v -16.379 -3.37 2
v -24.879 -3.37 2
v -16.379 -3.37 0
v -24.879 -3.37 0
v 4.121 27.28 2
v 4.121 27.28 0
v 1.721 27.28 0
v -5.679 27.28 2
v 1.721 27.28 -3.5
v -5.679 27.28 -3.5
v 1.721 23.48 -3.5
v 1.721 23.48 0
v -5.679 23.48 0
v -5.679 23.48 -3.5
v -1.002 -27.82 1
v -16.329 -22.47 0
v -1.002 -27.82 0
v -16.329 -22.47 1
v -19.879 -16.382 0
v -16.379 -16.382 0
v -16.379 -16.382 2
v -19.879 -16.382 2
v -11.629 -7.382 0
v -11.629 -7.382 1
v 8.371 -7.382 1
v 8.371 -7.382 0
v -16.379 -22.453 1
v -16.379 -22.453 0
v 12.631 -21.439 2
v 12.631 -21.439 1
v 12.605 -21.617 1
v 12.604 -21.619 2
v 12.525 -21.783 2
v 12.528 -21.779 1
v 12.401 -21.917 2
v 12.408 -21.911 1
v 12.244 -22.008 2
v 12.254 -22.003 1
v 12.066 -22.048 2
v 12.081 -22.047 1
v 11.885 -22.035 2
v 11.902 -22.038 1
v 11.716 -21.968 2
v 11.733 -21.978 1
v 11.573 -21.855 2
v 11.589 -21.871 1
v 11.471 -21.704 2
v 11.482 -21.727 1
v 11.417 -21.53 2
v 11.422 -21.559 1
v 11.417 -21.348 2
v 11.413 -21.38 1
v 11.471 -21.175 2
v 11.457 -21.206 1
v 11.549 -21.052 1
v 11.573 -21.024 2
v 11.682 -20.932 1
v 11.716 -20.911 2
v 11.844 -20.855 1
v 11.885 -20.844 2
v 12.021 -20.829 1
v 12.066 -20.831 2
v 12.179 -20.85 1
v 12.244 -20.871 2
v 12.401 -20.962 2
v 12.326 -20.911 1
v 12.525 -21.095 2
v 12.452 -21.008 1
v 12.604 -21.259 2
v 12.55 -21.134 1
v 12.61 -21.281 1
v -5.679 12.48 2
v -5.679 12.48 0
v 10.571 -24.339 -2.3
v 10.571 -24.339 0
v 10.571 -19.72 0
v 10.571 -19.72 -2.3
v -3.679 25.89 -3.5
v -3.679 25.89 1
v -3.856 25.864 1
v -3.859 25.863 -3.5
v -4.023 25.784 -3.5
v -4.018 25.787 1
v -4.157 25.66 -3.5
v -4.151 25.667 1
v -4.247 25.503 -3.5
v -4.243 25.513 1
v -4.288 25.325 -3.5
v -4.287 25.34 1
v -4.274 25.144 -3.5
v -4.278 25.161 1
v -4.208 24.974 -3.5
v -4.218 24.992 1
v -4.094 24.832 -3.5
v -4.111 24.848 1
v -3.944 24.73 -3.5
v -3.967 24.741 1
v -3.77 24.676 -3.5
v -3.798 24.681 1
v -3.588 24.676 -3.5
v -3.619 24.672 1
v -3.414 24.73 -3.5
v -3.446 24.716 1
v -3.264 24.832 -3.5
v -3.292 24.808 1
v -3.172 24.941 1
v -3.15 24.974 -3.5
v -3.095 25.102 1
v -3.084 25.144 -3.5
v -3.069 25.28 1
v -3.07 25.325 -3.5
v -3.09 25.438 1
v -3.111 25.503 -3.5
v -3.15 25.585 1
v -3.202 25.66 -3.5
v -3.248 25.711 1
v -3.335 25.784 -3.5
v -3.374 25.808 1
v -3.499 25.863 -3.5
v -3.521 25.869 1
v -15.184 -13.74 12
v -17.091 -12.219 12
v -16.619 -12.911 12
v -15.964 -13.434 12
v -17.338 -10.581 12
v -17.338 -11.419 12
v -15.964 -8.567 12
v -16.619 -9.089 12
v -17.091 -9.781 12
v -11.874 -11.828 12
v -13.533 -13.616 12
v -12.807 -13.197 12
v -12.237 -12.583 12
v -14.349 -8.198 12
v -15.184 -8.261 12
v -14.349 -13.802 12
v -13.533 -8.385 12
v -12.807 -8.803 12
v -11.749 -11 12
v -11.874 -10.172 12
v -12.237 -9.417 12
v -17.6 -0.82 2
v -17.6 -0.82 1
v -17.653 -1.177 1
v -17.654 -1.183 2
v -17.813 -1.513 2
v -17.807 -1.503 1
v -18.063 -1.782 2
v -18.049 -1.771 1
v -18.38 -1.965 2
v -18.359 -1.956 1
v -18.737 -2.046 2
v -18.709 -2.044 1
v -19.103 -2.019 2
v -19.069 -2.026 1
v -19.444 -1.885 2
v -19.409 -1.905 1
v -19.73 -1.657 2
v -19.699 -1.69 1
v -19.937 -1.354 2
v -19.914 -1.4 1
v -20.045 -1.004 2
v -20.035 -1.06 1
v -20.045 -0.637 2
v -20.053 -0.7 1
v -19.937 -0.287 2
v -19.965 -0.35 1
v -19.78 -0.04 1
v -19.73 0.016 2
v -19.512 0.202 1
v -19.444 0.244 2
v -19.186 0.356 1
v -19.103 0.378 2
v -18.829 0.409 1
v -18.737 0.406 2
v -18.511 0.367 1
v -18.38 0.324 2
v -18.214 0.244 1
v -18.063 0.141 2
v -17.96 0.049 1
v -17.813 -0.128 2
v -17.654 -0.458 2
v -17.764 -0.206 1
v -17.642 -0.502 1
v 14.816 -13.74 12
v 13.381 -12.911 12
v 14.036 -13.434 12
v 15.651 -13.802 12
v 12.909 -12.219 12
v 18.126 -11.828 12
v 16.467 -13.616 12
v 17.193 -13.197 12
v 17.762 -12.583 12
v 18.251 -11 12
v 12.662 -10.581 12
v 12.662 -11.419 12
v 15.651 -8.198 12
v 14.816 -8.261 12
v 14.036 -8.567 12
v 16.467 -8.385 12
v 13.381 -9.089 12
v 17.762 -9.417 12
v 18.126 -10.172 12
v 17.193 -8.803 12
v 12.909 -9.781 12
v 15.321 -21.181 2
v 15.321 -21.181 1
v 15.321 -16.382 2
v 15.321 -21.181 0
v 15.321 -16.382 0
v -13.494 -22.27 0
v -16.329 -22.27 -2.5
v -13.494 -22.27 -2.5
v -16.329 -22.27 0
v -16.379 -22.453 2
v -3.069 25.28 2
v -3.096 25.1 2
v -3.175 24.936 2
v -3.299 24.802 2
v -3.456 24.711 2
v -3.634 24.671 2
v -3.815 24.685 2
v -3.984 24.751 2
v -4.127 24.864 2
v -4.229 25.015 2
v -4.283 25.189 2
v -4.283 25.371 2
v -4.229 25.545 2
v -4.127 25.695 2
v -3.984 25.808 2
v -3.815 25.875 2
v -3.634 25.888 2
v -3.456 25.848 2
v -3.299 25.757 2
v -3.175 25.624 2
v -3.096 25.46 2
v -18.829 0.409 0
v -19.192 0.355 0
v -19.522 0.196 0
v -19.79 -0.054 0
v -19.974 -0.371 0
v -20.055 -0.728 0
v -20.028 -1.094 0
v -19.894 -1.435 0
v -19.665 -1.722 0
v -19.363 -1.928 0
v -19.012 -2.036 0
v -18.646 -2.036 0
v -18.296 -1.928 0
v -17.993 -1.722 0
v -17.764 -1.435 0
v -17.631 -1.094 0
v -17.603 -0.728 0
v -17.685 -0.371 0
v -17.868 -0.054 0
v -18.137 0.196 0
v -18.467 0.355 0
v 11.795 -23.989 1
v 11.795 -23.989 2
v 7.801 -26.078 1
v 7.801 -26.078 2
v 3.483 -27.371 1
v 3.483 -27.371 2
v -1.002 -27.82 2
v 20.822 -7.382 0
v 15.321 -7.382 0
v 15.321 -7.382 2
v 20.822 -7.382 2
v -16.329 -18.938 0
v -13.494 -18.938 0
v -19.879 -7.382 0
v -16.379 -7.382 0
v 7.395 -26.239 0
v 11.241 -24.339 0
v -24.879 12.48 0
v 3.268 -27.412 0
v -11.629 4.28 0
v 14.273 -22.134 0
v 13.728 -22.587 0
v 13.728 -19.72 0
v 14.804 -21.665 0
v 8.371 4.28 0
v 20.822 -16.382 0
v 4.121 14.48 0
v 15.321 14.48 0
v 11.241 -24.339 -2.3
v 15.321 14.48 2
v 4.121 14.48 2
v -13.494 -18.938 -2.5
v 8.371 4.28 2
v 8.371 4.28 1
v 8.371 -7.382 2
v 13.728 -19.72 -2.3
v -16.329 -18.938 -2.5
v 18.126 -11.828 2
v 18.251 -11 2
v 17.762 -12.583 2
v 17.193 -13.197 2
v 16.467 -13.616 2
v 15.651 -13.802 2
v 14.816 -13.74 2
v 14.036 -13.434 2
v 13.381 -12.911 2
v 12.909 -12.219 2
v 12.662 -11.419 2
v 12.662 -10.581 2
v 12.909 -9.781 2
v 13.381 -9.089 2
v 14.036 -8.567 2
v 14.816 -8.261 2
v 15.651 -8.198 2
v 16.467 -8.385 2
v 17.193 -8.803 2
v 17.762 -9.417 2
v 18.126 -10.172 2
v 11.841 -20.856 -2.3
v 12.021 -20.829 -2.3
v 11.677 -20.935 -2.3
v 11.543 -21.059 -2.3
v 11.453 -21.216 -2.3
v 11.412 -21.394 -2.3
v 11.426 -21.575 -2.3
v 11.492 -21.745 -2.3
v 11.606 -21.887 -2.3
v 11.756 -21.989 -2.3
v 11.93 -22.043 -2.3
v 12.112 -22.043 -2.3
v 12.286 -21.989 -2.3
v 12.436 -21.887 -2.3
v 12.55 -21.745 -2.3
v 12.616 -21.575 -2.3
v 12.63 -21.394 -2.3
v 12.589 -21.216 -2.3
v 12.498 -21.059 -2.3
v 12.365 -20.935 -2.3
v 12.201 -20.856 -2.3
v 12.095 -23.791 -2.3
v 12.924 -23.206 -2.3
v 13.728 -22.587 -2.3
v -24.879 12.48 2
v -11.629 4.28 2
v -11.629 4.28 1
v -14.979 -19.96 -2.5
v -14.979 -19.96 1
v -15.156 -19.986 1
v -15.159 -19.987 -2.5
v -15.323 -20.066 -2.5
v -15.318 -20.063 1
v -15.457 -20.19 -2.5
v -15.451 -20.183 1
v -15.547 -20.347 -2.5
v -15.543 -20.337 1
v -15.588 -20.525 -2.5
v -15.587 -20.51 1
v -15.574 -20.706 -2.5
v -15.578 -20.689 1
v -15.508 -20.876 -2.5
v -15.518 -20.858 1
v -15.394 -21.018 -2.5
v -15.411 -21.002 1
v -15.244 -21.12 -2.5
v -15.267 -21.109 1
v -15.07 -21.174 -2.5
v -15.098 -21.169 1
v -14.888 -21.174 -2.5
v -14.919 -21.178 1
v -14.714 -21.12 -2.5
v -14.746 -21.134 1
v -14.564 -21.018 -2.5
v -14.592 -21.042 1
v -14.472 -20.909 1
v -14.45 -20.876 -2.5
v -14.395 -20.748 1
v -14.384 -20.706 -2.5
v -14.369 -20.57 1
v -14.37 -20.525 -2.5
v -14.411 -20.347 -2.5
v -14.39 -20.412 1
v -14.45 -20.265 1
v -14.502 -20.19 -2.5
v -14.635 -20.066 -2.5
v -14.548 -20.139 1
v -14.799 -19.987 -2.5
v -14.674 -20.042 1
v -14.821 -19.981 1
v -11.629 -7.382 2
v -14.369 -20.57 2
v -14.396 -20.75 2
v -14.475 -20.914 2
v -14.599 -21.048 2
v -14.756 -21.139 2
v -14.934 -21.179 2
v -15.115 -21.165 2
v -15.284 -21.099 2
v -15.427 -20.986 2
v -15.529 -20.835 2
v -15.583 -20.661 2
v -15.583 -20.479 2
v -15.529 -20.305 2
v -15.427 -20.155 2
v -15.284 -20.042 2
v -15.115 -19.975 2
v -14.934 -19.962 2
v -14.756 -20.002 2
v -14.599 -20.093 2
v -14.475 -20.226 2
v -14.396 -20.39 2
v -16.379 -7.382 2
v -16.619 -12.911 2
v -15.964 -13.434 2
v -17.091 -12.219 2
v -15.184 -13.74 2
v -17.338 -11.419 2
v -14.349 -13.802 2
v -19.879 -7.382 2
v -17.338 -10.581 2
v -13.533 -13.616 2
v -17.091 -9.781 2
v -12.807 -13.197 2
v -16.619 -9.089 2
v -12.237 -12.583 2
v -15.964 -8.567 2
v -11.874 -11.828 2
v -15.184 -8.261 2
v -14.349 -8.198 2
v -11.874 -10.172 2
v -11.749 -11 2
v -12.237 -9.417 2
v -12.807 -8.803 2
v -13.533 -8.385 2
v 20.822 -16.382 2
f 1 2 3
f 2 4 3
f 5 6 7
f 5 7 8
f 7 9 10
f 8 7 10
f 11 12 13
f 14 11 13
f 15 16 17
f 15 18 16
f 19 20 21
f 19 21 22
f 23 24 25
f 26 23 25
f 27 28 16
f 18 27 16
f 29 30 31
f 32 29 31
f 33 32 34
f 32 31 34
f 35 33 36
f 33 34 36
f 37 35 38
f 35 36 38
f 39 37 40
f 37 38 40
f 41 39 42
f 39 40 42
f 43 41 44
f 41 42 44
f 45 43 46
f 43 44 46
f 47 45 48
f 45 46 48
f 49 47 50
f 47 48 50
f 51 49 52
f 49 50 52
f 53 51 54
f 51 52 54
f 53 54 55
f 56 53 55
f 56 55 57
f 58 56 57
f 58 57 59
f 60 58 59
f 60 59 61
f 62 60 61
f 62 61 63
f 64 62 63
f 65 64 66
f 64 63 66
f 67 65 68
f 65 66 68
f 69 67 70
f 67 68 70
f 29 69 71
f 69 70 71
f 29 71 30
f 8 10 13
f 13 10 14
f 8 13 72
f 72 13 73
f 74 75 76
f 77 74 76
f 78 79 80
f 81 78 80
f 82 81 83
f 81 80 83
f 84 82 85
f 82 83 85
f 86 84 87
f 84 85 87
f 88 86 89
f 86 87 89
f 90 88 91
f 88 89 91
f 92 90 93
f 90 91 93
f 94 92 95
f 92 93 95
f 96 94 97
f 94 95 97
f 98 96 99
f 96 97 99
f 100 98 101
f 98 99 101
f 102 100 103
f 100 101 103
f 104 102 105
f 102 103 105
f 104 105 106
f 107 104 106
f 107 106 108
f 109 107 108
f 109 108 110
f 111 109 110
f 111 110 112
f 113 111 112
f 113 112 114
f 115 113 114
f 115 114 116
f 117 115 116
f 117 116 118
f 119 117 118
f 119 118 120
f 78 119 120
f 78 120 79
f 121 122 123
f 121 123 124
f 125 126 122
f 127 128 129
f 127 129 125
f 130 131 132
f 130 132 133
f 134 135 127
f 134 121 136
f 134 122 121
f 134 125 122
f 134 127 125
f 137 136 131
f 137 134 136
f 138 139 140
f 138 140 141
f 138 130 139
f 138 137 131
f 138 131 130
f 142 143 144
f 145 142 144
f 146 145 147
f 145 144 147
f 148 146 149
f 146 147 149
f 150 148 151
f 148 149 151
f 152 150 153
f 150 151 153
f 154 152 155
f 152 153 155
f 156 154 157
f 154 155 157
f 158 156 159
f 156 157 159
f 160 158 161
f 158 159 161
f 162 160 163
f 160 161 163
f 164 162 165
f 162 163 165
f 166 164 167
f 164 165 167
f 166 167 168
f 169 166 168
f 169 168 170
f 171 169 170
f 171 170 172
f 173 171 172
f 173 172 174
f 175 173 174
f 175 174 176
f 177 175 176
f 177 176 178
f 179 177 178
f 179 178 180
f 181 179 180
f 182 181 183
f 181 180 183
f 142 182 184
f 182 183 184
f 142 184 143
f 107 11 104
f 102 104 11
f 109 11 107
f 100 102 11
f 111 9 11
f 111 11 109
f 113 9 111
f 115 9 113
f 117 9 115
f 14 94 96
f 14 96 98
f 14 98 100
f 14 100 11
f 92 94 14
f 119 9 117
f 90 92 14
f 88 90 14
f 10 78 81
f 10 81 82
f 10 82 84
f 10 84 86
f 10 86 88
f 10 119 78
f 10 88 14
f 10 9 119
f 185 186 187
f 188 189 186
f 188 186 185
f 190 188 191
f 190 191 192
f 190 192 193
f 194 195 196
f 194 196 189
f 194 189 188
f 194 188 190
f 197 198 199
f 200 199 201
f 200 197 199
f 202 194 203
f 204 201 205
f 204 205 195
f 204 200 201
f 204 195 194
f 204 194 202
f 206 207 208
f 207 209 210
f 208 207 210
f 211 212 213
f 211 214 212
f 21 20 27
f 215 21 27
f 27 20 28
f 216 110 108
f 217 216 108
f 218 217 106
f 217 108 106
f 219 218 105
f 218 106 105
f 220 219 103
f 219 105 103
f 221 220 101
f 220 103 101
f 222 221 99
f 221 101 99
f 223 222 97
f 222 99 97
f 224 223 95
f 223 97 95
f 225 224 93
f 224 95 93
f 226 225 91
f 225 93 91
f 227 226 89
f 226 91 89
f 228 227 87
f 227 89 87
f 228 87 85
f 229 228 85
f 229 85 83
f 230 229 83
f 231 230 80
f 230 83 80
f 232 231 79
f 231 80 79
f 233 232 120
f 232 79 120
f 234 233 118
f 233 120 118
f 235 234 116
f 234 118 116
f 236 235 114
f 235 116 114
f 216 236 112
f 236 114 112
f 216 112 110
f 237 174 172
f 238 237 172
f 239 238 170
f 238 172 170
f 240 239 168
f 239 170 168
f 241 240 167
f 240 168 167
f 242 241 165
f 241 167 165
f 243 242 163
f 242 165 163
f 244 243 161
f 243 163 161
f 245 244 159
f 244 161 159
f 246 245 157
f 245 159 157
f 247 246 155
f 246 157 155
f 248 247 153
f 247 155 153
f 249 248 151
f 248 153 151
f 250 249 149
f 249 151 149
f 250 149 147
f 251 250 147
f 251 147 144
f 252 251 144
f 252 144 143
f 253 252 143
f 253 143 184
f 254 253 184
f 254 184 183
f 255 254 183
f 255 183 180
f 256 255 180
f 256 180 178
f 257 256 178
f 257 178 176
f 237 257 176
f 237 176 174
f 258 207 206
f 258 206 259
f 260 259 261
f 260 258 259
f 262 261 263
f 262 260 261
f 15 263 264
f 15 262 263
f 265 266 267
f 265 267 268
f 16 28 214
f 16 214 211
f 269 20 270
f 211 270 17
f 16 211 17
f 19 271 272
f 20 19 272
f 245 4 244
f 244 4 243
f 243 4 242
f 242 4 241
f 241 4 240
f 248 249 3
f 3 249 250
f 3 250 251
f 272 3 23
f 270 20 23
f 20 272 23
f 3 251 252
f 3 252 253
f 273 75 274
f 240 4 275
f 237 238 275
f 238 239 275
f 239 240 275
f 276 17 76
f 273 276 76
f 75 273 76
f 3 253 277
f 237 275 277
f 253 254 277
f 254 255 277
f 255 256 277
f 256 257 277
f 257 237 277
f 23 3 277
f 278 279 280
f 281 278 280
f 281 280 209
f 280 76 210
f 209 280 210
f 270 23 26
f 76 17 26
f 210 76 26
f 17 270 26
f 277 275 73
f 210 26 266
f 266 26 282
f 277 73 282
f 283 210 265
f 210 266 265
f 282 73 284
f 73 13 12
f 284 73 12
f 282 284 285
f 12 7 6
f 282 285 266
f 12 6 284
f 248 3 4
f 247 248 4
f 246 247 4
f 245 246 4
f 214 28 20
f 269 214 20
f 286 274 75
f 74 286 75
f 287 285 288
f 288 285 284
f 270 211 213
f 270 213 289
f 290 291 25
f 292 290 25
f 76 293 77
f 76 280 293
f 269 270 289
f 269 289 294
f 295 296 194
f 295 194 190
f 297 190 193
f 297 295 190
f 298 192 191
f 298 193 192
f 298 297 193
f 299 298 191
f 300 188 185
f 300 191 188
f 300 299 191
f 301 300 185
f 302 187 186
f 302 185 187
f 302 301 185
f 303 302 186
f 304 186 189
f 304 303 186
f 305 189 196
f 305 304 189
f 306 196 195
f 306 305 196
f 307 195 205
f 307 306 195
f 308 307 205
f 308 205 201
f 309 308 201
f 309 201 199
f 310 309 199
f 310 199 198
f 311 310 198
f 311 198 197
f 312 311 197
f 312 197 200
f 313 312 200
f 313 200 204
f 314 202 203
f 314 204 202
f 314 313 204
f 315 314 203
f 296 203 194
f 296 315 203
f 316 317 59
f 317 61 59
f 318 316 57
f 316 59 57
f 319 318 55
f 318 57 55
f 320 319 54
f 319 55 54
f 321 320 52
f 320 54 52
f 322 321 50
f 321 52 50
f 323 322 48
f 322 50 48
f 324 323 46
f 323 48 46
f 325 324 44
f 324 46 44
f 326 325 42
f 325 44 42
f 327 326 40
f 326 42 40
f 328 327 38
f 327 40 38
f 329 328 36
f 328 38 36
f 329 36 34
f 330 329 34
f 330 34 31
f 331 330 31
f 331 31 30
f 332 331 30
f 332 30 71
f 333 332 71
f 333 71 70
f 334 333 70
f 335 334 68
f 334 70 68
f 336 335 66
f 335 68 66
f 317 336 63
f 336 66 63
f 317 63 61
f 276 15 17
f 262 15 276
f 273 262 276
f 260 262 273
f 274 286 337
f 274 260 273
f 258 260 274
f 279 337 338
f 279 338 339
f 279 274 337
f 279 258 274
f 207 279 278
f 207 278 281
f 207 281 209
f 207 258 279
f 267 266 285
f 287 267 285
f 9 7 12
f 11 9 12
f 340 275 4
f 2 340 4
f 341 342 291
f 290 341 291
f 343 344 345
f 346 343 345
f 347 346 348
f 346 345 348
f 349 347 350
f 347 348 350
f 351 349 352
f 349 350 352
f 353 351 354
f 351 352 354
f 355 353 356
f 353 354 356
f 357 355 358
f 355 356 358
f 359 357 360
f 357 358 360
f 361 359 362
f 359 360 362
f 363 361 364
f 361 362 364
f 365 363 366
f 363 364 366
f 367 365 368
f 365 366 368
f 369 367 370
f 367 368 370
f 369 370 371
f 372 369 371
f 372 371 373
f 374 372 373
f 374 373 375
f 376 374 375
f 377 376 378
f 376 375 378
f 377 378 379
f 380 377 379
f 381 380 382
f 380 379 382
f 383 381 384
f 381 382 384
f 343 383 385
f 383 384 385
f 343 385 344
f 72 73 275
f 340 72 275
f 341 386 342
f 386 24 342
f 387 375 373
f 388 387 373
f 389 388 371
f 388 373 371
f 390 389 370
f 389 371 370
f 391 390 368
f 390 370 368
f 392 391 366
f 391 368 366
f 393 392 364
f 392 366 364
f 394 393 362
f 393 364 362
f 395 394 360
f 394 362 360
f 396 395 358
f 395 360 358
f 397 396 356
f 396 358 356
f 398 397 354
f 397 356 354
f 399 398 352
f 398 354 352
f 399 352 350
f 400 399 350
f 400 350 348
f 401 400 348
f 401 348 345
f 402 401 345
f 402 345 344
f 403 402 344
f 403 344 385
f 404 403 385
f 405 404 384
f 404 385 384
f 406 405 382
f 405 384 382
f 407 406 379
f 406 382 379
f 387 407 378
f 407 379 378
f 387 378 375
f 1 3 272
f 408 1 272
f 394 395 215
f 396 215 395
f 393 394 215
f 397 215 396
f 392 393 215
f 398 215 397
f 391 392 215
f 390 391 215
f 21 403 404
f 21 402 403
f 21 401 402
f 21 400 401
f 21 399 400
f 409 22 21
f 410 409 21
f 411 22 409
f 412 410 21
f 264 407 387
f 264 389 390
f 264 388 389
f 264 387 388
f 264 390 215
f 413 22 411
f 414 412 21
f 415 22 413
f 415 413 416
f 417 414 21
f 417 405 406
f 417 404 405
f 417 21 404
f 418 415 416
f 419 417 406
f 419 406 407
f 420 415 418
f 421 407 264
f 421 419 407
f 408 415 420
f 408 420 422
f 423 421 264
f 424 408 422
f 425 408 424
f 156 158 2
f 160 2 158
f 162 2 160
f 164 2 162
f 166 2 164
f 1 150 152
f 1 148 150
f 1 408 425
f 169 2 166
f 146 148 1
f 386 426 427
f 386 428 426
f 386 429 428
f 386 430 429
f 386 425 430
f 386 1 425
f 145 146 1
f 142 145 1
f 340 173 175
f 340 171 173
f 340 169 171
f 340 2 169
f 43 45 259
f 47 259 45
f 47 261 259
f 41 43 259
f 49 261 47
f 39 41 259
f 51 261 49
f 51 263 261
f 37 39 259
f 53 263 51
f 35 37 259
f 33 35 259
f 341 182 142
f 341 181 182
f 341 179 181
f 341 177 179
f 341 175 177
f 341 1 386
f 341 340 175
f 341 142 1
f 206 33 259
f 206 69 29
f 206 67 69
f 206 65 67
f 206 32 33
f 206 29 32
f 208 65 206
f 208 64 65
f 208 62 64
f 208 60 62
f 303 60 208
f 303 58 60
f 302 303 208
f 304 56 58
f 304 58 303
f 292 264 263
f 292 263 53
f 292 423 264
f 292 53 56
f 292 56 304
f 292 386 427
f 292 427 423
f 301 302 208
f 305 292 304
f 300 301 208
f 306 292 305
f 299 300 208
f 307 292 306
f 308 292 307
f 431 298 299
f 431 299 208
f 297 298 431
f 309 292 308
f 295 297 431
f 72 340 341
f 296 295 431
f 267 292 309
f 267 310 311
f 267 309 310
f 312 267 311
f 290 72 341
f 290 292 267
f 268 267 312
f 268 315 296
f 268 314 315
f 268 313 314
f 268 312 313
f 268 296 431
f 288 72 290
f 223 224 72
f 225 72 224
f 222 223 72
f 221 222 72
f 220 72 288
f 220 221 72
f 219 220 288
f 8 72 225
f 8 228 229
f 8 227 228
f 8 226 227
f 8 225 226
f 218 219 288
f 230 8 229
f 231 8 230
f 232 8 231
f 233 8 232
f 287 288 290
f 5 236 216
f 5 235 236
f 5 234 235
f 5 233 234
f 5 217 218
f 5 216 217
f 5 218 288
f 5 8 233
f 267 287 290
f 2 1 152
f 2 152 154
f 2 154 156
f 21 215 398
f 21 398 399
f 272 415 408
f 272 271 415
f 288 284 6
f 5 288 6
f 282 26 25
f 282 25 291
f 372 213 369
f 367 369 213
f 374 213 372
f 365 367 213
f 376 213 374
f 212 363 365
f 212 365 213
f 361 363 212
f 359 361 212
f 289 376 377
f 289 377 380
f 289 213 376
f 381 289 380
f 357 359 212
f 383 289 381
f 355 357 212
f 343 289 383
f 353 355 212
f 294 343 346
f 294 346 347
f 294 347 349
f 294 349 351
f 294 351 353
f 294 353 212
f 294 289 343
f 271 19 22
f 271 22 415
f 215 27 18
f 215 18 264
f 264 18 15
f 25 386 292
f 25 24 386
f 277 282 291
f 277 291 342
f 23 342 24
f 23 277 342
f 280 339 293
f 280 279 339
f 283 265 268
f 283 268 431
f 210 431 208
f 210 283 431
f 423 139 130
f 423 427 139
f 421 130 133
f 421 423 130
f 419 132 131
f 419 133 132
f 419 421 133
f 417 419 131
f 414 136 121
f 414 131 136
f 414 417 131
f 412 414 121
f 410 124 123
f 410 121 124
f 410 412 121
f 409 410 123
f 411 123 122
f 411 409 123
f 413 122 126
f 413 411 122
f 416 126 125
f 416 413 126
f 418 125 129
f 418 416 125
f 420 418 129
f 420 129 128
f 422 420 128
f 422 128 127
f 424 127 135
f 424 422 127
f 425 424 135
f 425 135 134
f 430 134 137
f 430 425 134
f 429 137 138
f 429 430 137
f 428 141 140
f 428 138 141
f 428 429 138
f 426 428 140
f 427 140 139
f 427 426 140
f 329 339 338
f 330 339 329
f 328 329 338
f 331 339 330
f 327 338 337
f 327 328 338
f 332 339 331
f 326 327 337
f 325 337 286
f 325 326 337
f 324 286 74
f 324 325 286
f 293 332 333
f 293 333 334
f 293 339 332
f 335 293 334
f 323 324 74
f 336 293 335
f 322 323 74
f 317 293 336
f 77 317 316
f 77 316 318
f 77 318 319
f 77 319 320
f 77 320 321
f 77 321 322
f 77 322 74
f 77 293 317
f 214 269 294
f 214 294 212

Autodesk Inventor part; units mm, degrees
ref_plane "YZ Plane" through (0, 0, 0) normal (1, 0, 0) x (0, 1, 0)
ref_plane "XZ Plane" through (0, 0, 0) normal (0, 1, 0) x (-1, 0, 0)
ref_plane "XY Plane" through (0, 0, 0) normal (0, 0, 1) x (1, 0, 0)
sketch "Skizze1" plane through (0, 0, 0) normal (0, 0, 1) x (1, 0, 0)
  circle A0 centre (-18.8292, -0.8203) radius 1.45 construction
  line L0 (-24.8792, -2.7703) -> (-24.8792, 8.6797) construction
  arc A1 (-11.8792, -25.2203) -> (6.3208, -26.6782) centre (-1.0025, -3.77) ccw construction
  circle A2 centre (-14.9792, -20.5703) radius 0.9 construction
  circle A3 centre (12.0208, -21.4394) radius 0.9 construction
  circle A4 centre (-3.6792, 25.2797) radius 0.9 construction
  line L1 (-5.6792, 27.2797) -> (3.4208, 27.2797) construction
  line L2 (25.1208, 7.4797) -> (25.1208, -1.5203) construction
  line L3 (25.1208, -27.8203) -> (-24.8792, -27.8203)
  line L4 (-24.8792, -27.8203) -> (-24.8792, 27.2797)
  line L5 (-24.8792, 27.2797) -> (25.1208, 27.2797)
  line L6 (25.1208, 27.2797) -> (25.1208, -27.8203)
  line L7 (4.6208, 0.2797) -> (4.6208, -6.9703) construction
  line L8 (-4.8792, 0.2797) -> (4.6208, 0.2797) construction
  line L9 (-4.8792, -6.9703) -> (-4.8792, 0.2797) construction
  line L10 (4.6208, -6.9703) -> (-4.8792, -6.9703) construction
  line L11 (-2.2292, 2.2797) -> (1.9708, 2.2797) construction
  line L12 (6.3708, 2.2797) -> (1.9708, 2.2797) construction
  line L13 (6.3708, -8.9703) -> (6.3708, 2.2797) construction
  line L14 (1.9708, -8.9703) -> (6.3708, -8.9703) construction
  line L15 (1.9708, -8.9703) -> (-2.2292, -8.9703) construction
  line L16 (-6.6292, -8.9703) -> (-2.2292, -8.9703) construction
  line L17 (-6.6292, 2.2797) -> (-6.6292, -8.9703) construction
  line L18 (-2.2292, 2.2797) -> (-6.6292, 2.2797) construction
  line L19 (-11.6292, -10.9703) -> (8.3708, -10.9703)
  line L20 (8.3708, -10.9703) -> (8.3708, 4.2797)
  line L21 (8.3708, 4.2797) -> (-11.6292, 4.2797)
  line L22 (-11.6292, 4.2797) -> (-11.6292, -10.9703)
  point P0 (0, 0)
  dimension "d48" = 2
  dimension "d49" = 2
  dimension "d50" = 2
  dimension "d51" = 5
extrude "Extrusion1" add sketch "Skizze1" along normal blind 1
sketch "Skizze2" plane through (0, 0, 0) normal (0, 0, -1) x (-1, 0, 0)
  circle A0 centre (14.9792, -20.5703) radius 0.9 projected
  circle A1 centre (-12.0208, -21.4394) radius 0.9 construction
  circle A2 centre (3.6792, 25.2797) radius 0.9 construction
  circle A3 centre (14.9792, -20.5703) radius 0.9 projected
  circle A4 centre (9.7292, -19.9703) radius 0.75 projected
  line L0 (17.9792, -20.8203) -> (16.3292, -20.8203) construction
  line L1 (7.7292, -22.4703) -> (11.8792, -22.4703) construction
  line L2 (7.7292, -17.4703) -> (7.7292, -22.4703) construction
  line L3 (16.3292, -17.4703) -> (7.7292, -17.4703) construction
  line L4 (16.3292, -20.8203) -> (16.3292, -17.4703) construction
  line L5 (16.3292, -22.2703) -> (7.9292, -22.2703)
  line L6 (7.9292, -22.2703) -> (7.9292, -17.6703)
  line L7 (7.9292, -17.6703) -> (16.3292, -17.6703)
  line L8 (16.3292, -17.6703) -> (16.3292, -22.2703)
  line L9 (11.8792, -22.2703) -> (12.162, -22.2703) construction
  line L10 (16.3292, -17.6703) -> (12.3496, -17.6703)
  line L11 (12.3496, -17.6703) -> (12.3496, -22.2703)
  line L12 (12.3496, -22.2703) -> (16.3292, -22.2703)
  line L13 (16.3292, -22.2703) -> (16.3292, -17.6703)
  line L14 (16.3292, -22.2703) -> (13.494, -22.2703)
  line L15 (13.494, -22.2703) -> (13.494, -18.9379)
  line L16 (13.494, -18.9379) -> (16.3292, -18.9379)
  line L17 (16.3292, -18.9379) -> (16.3292, -22.2703)
  point P0 (0, 0)
  dimension "d3" = 0.2
  dimension "d4" = 0.2
  dimension "d9" = 0.2
extrude "Extrusion2" add sketch "Skizze2" along normal blind 2.5 contours A0 | L5 L15 L16 L8
sketch "Skizze3" plane through (0, 0, -2.5) normal (0, 0, -1) x (-1, 0, 0)
  circle A0 centre (14.9792, -20.5703) radius 0.9 construction
  point P0 (0, 0)
hole "Bohrung1" at (-14.9792, -20.5703, -2.5) direction (0, 0, 1) diameter 1.221 depth 6.1 tip angle 118 thread size "M1.6x0.35" class "6H" standard "ISO Metric profile"
sketch "Skizze4" plane through (0, 0, 0) normal (0, 0, -1) x (-1, 0, 0)
  circle A0 centre (18.8292, -0.8203) radius 1.45 construction
  point P0 (0, 0)
hole "Bohrung2" at (-18.8292, -0.8203, 0) direction (0, 0, 1) diameter 2.459 end through all thread size "M3x0.5" class "6H" standard "ISO Metric profile"
sketch "Skizze5" plane through (0, 0, 0) normal (0, 0, -1) x (-1, 0, 0)
  line L0 (-9.3708, -21.4703) -> (-9.3708, -17.9703) construction
  line L1 (-14.1208, -16.9703) -> (-14.1208, -22.4703) construction
  line L2 (-15.3208, -16.9703) -> (-10.3708, -16.9703) construction
  line L3 (-9.3708, -17.9703) -> (-10.3708, -16.9703) construction
  line L4 (-9.3708, -21.4703) -> (-9.3708, -17.9703) construction
  line L5 (-10.5708, -16.9703) -> (-15.3208, -16.9703)
  line L6 (-15.3208, -16.9703) -> (-15.3208, -24.3394)
  line L7 (-15.3208, -24.3394) -> (-10.5708, -24.3394)
  line L8 (-10.5708, -24.3394) -> (-10.5708, -16.9703)
  line L9 (-15.3208, -16.9703) -> (-15.3208, -1.5203) construction
  circle A0 centre (-12.0208, -21.4394) radius 0.9 construction
  line L10 (-10.5708, -24.3394) -> (-13.7279, -24.3394)
  line L11 (-13.7279, -24.3394) -> (-13.7279, -16.9703)
  line L12 (-13.7279, -16.9703) -> (-10.5708, -16.9703)
  line L13 (-10.5708, -16.9703) -> (-10.5708, -24.3394)
  line L14 (-10.5708, -24.3394) -> (-13.7279, -24.3394)
  line L15 (-13.7279, -24.3394) -> (-13.7279, -19.7203)
  line L16 (-13.7279, -19.7203) -> (-10.5708, -19.7203)
  line L17 (-10.5708, -19.7203) -> (-10.5708, -24.3394)
  point P0 (0, 0)
extrude "Extrusion3" add sketch "Skizze5" along normal blind 2.3 contours L8 L7 L11 L16
sketch "Skizze6" plane through (0, 0, -2.3) normal (0, 0, -1) x (-1, 0, 0)
  circle A0 centre (-12.0208, -21.4394) radius 0.9 construction
  point P0 (0, 0)
hole "Bohrung3" at (12.0208, -21.4394, -2.3) direction (0, 0, 1) diameter 1.221 depth 7.1 tip angle 118 thread size "M1.6x0.35" class "6H" standard "ISO Metric profile"
sketch "Skizze7" plane through (0, 0, 0) normal (0, 0, -1) x (-1, 0, 0)
  circle A0 centre (3.6792, 25.2797) radius 0.9 construction
  line L0 (-3.4208, 24.7797) -> (-3.4208, 27.2797) construction
  line L1 (-1.9208, 24.7797) -> (-3.4208, 24.7797) construction
  line L2 (-1.9208, 23.2797) -> (-1.9208, 24.7797) construction
  line L3 (5.6792, 23.2797) -> (-1.9208, 23.2797) construction
  line L4 (5.6792, 27.2797) -> (5.6792, 23.2797) construction
  line L5 (-3.4208, 27.2797) -> (5.6792, 27.2797) construction
  line L6 (6.6792, 27.2797) -> (-1.7208, 27.2797)
  line L7 (-1.7208, 27.2797) -> (-1.7208, 23.4797)
  line L8 (-1.7208, 23.4797) -> (6.6792, 23.4797)
  line L9 (6.6792, 23.4797) -> (6.6792, 27.2797)
  point P0 (0, 0)
  dimension "d35" = 0.2
  dimension "d36" = 0.2
  dimension "d38" = 3
extrude "Extrusion4" add sketch "Skizze7" along normal blind 3.5
sketch "Skizze8" plane through (0, 0, -3.5) normal (0, 0, -1) x (-1, 0, 0)
  circle A0 centre (3.6792, 25.2797) radius 0.9 construction
  point P0 (0, 0)
hole "Bohrung4" at (-3.6792, 25.2797, -3.5) direction (0, 0, 1) diameter 1.221 depth 7.1 tip angle 118 thread size "M1.6x0.35" class "6H" standard "ISO Metric profile"
sketch "Sketch9" plane through (0, 0, 1) normal (0, 0, 1) x (1, 0, 0)
  circle A0 centre (-18.8292, -0.8203) radius 1.45 construction
  line L0 (-22.6792, 10.4902) -> (-22.6792, -2.5703) construction
  line L1 (-22.6792, -2.5703) -> (-21.2792, -2.5703) construction
  line L2 (-21.2792, -2.5703) -> (-21.2792, 8.1297) construction
  arc A1 (-19.5792, 9.8297) -> (-21.2792, 8.1297) centre (-19.5792, 8.1297) ccw construction
  line L3 (-19.5792, 9.8297) -> (-13.5792, 9.8297) construction
  line L4 (-13.5792, 9.8297) -> (-13.5792, 11.4797) construction
  line L5 (-13.5792, 11.4797) -> (-22.1079, 11.4797) construction
  line L6 (-22.1079, 11.4797) -> (-22.6792, 10.4902) construction
  line L7 (-5.6792, 23.2797) -> (1.9208, 23.2797) construction
  line L8 (1.9208, 23.2797) -> (1.9208, 24.7797) construction
  line L9 (1.9208, 24.7797) -> (4.1208, 24.7797) construction
  line L10 (4.1208, 24.7797) -> (4.1208, 14.4797) construction
  line L11 (4.1208, 14.4797) -> (20.1208, 14.4797) construction
  line L12 (20.1208, 14.4797) -> (20.1208, 12.4797) construction
  line L13 (20.1208, 12.4797) -> (22.2341, 12.4797) construction
  line L14 (22.2341, 12.4797) -> (25.1208, 7.4797) construction
  line L15 (25.1208, 7.4797) -> (25.1208, -1.5203) construction
  line L16 (25.1208, -1.5203) -> (15.8208, -1.5203) construction
  line L17 (15.8208, -1.5203) -> (15.8208, -0.8203) construction
  line L18 (15.8208, -0.8203) -> (11.8208, -0.8203) construction
  line L19 (11.8208, -0.8203) -> (11.8208, -19.3203) construction
  line L20 (11.8208, -19.3203) -> (10.8208, -19.3203) construction
  line L21 (10.8208, -19.3203) -> (10.8208, 0.6797) construction
  line L22 (10.8208, 0.6797) -> (11.8208, 0.6797) construction
  line L23 (11.8208, 0.6797) -> (11.8208, 10.4297) construction
  line L24 (11.8208, 10.4297) -> (5.3208, 10.4297) construction
  line L25 (5.3208, 10.4297) -> (5.3208, 9.1297) construction
  line L26 (5.3208, 9.1297) -> (-19.5792, 9.1297) construction
  arc A2 (-19.5792, 9.1297) -> (-20.5792, 8.1297) centre (-19.5792, 8.1297) ccw construction
  line L27 (-20.5792, 8.1297) -> (-20.5792, 2.1297) construction
  arc A3 (-20.5792, 2.1297) -> (-20.0792, 1.6297) centre (-20.0792, 2.1297) ccw construction
  line L28 (-20.0792, 1.6297) -> (-18.8292, 1.6297) construction
  arc A4 (-16.3792, -0.8203) -> (-18.8292, 1.6297) centre (-18.8292, -0.8203) ccw construction
  line L29 (-16.3792, -0.8203) -> (-16.3792, -1.3703) construction
  arc A5 (-18.3792, -3.3703) -> (-16.3792, -1.3703) centre (-18.3792, -1.3703) ccw construction
  line L30 (-18.3792, -3.3703) -> (-23.4792, -3.3703) construction
  line L31 (-23.4792, -3.3703) -> (-23.4792, 11.1046) construction
  line L32 (-23.4792, 11.1046) -> (-22.6852, 12.4797) construction
  line L33 (-22.6852, 12.4797) -> (-13.6792, 12.4797) construction
  arc A6 (-13.6792, 12.4797) -> (-5.6792, 20.4797) centre (-13.6792, 20.4797) ccw construction
  line L34 (-5.6792, 20.4797) -> (-5.6792, 23.2797) construction
  line L35 (-7.8792, -20.1624) -> (-7.8792, -26.8162) construction
  arc A7 (-9.8792, -26.1222) -> (-7.8792, -26.8162) centre (-1.0025, -3.77) ccw construction
  line L36 (-9.8792, -26.1222) -> (-9.8792, -22.1222) construction
  line L37 (-9.8792, -22.1222) -> (-13.6811, -18.3203) construction
  line L38 (-13.6811, -18.3203) -> (-16.6811, -18.3203) construction
  line L39 (-16.6811, -18.3203) -> (-16.6811, -20.8203) construction
  line L40 (-24.8792, -20.8203) -> (-16.6811, -20.8203) construction
  line L41 (-24.8792, -3.3703) -> (-24.8792, -20.8203) construction
  line L42 (-18.3792, -3.3703) -> (-24.8792, -3.3703) construction
  arc A8 (-18.3792, -3.3703) -> (-16.3792, -1.3703) centre (-18.3792, -1.3703) ccw construction
  line L43 (-16.3792, -15.8703) -> (-16.3792, -1.3703) construction
  line L44 (-12.1713, -15.8703) -> (-16.3792, -15.8703) construction
  line L45 (-12.1713, -15.8703) -> (-7.8792, -20.1624) construction
  line L46 (9.3208, 7.5297) -> (11.8208, 7.5297) construction
  line L47 (11.8208, 0.6797) -> (11.8208, 7.5297) construction
  line L48 (10.8208, 0.6797) -> (11.8208, 0.6797) construction
  line L49 (10.8208, -19.3203) -> (10.8208, 0.6797) construction
  line L50 (11.8208, -19.3203) -> (10.8208, -19.3203) construction
  line L51 (11.8208, -0.8203) -> (11.8208, -19.3203) construction
  line L52 (15.8208, -0.8203) -> (11.8208, -0.8203) construction
  line L53 (15.8208, -1.5203) -> (15.8208, -0.8203) construction
  line L54 (15.3208, -1.5203) -> (15.8208, -1.5203) construction
  line L55 (15.3208, -16.9703) -> (15.3208, -1.5203) construction
  line L56 (14.1208, -16.9703) -> (15.3208, -16.9703) construction
  line L57 (14.1208, -20.2394) -> (14.1208, -16.9703) construction
  line L58 (14.1208, -20.2394) -> (13.6208, -20.2394) construction
  arc A9 (13.6208, -20.2394) -> (10.0208, -21.4394) centre (12.0208, -21.4394) ccw construction
  line L59 (10.0208, -21.4394) -> (10.0208, -25.1453) construction
  arc A10 (-1.5792, -27.8134) -> (10.0208, -25.1453) centre (-1.0025, -3.77) ccw construction
  line L60 (-1.5792, -27.8134) -> (-1.5792, -26.4134) construction
  line L61 (-1.5792, -26.4134) -> (0.4208, -26.4134) construction
  line L62 (0.4208, -26.4134) -> (0.9208, -25.9134) construction
  line L63 (0.9208, -25.9134) -> (2.9208, -25.9134) construction
  line L64 (2.9208, -25.9134) -> (3.4208, -25.4134) construction
  line L65 (3.4208, -25.4134) -> (5.4208, -25.4134) construction
  line L66 (5.4208, -25.4134) -> (9.0208, -21.8134) construction
  line L67 (9.0208, -21.8134) -> (9.0208, -19.0634) construction
  arc A11 (9.0208, -19.0634) -> (6.6502, -18.7996) centre (7.8502, -18.7996) ccw construction
  line L68 (6.6502, -18.7996) -> (6.6502, -17.7996) construction
  line L69 (6.6502, -17.7996) -> (2.1208, -13.2703) construction
  line L70 (2.1208, -13.2703) -> (-13.8792, -13.2703) construction
  line L71 (-13.8792, 0.1297) -> (-13.8792, -13.2703) construction
  arc A12 (-13.8792, 0.1297) -> (-15.8792, 2.1297) centre (-15.8792, 0.1297) ccw construction
  line L72 (-16.9792, 2.1297) -> (-15.8792, 2.1297) construction
  arc A13 (-17.9792, 3.1297) -> (-16.9792, 2.1297) centre (-16.9792, 3.1297) ccw construction
  line L73 (-17.9792, 4.5047) -> (-17.9792, 3.1297) construction
  arc A14 (-15.9792, 6.5047) -> (-17.9792, 4.5047) centre (-15.9792, 4.5047) ccw construction
  line L74 (-15.9792, 6.5047) -> (7.845, 6.5047) construction
  arc A15 (7.845, 6.5047) -> (9.3208, 7.5297) centre (9.3208, 5.9547) ccw construction
  line L75 (-2.2292, 2.2797) -> (-6.6292, 2.2797) construction
  line L76 (-6.6292, 2.2797) -> (-6.6292, -8.9703) construction
  line L77 (-6.6292, -8.9703) -> (-2.2292, -8.9703) construction
  line L78 (-2.2292, -8.9703) -> (-2.2292, -9.9953) construction
  line L79 (-2.2292, -9.9953) -> (1.9708, -9.9953) construction
  line L80 (1.9708, -9.9953) -> (1.9708, -8.9703) construction
  line L81 (1.9708, -8.9703) -> (6.3708, -8.9703) construction
  line L82 (6.3708, -8.9703) -> (6.3708, 2.2797) construction
  line L83 (6.3708, 2.2797) -> (1.9708, 2.2797) construction
  line L84 (1.9708, 2.2797) -> (1.9708, 3.3047) construction
  line L85 (1.9708, 3.3047) -> (-2.2292, 3.3047) construction
  line L86 (-2.2292, 3.3047) -> (-2.2292, 2.2797) construction
  circle A16 centre (-12.8292, 4.1297) radius 1.575 construction
  circle A17 centre (7.8502, -14.7996) radius 1.575 construction
  circle A18 centre (-15.8292, 4.1297) radius 0.75 construction
  line L87 (16.6208, -9.5203) -> (16.6208, -1.5203) construction
  line L88 (24.6208, -9.5203) -> (24.6208, -1.5203) construction
  circle A19 centre (-3.6792, 25.2797) radius 0.6105 projected
  circle A20 centre (12.0208, -21.4394) radius 0.6105 projected
  circle A21 centre (-18.8292, -0.8203) radius 1.2295 projected
  circle A22 centre (-14.9792, -20.5703) radius 0.6105 projected
  line L89 (-11.6292, -10.9703) -> (-11.6292, 4.2797) projected
  line L90 (-11.6292, 4.2797) -> (8.3708, 4.2797) projected
  line L91 (8.3708, 4.2797) -> (8.3708, -10.9703) projected
  line L92 (8.3708, -10.9703) -> (-11.6292, -10.9703) projected
  line L93 (-24.8792, -27.8203) -> (25.1208, -27.8203) projected
  line L94 (25.1208, -27.8203) -> (25.1208, 27.2797) projected
  line L95 (25.1208, 27.2797) -> (-24.8792, 27.2797) projected
  line L96 (-24.8792, 27.2797) -> (-24.8792, -27.8203) projected
  line L97 (25.1208, 27.2797) -> (25.1208, -27.8203) projected
  line L98 (25.1208, 27.2797) -> (4.1208, 27.2797)
  line L99 (4.1208, 27.2797) -> (4.1208, 14.4797)
  line L100 (4.1208, 14.4797) -> (25.1208, 14.4797)
  line L101 (25.1208, 14.4797) -> (25.1208, 27.2797)
  line L102 (-24.8792, 27.2797) -> (-6.6792, 27.2797) projected
  line L103 (-24.8792, 27.2797) -> (-5.6792, 27.2797)
  line L104 (-5.6792, 27.2797) -> (-5.6792, 12.4797)
  line L105 (-5.6792, 12.4797) -> (-24.8792, 12.4797)
  line L106 (-24.8792, 12.4797) -> (-24.8792, 27.2797)
  line L107 (25.1208, -27.8203) -> (15.3208, -27.8203)
  line L108 (15.3208, -27.8203) -> (15.3208, 14.4797)
  line L109 (15.3208, 14.4797) -> (25.1208, 14.4797)
  line L110 (25.1208, 14.4797) -> (25.1208, -27.8203)
  line L111 (-24.8792, -27.8203) -> (-16.3792, -27.8203)
  line L112 (-16.3792, -27.8203) -> (-16.3792, -3.3703)
  line L113 (-16.3792, -3.3703) -> (-24.8792, -3.3703)
  line L114 (-24.8792, -3.3703) -> (-24.8792, -27.8203)
  line L115 (-16.3292, -22.2703) -> (-7.9292, -22.2703) projected
  line L116 (15.3208, -16.9703) -> (15.3208, -24.3394) projected
  arc A23 (-16.3292, -22.2703) -> (15.3208, -21.1808) centre (-1.1083, -4.1747) ccw
  line L117 (-16.3292, -22.2703) -> (-16.3792, -22.2703)
  line L118 (25.1208, -27.8203) -> (-24.8792, -27.8203) projected
  line L119 (-7.9292, -22.2703) -> (-16.3292, -22.2703) projected
  line L120 (-16.3292, -22.2703) -> (-1.0025, -27.8203)
  point P0 (0, 0)
  point P1 (-21.6292, -3.3703)
extrude "Extrusion5" cut sketch "Sketch9" against normal blind 10 contours L96 L113 L112 L93 | A23 L108 L93 | L96 L95 L104 L105 | L108 L100 L94 L93 | L100 L99 L95 L94
sketch "Sketch11" plane through (0, 0, 1) normal (0, 0, 1) x (1, 0, 0)
  arc A0 (-1.0025, -27.8203) -> (15.3208, -21.1808) centre (-1.1083, -4.1747) ccw projected
  point P0 (0, 0)
sketch "Sketch12" plane through (0, 0, 1) normal (0, 0, 1) x (1, 0, 0)
  line L0 (-11.6292, -10.9703) -> (-11.6292, 4.2797) projected
  line L1 (-11.6292, 4.2797) -> (8.3708, 4.2797) projected
  line L2 (8.3708, 4.2797) -> (8.3708, -10.9703) projected
  line L3 (8.3708, -10.9703) -> (-11.6292, -10.9703) projected
  circle A0 centre (-14.9792, -20.5703) radius 0.6105 projected
  circle A1 centre (-18.8292, -0.8203) radius 1.2295 projected
  circle A2 centre (12.0208, -21.4394) radius 0.6105 projected
  circle A3 centre (-3.6792, 25.2797) radius 0.6105 projected
  arc A4 (-1.0025, -27.8203) -> (15.3208, -21.1808) centre (-1.1083, -4.1747) ccw projected
  line L4 (15.3208, -21.1808) -> (15.3208, 14.4797) projected
  line L5 (15.3208, 14.4797) -> (4.1208, 14.4797) projected
  line L6 (4.1208, 14.4797) -> (4.1208, 27.2797) projected
  line L7 (4.1208, 27.2797) -> (-5.6792, 27.2797) projected
  line L8 (-5.6792, 27.2797) -> (-5.6792, 12.4797) projected
  line L9 (-5.6792, 12.4797) -> (-24.8792, 12.4797) projected
  line L10 (-24.8792, 12.4797) -> (-24.8792, -3.3703) projected
  line L11 (-24.8792, -3.3703) -> (-16.3792, -3.3703) projected
  line L12 (-16.3792, -3.3703) -> (-16.3792, -27.8203) projected
  line L13 (-16.3792, -27.8203) -> (-1.0025, -27.8203) projected
  line L14 (-16.3292, -22.4703) -> (-17.9792, -20.8203) projected
  line L15 (-16.3792, -27.8203) -> (-1.0025, -27.8203) projected
  arc A5 (-1.0025, -27.8203) -> (15.3208, -21.1808) centre (-1.1083, -4.1747) ccw projected
  line L16 (-16.3292, -22.4703) -> (-1.0025, -27.8203)
  line L17 (-17.5522, -22.0433) -> (2.1832, -28.9323)
  line L18 (2.1832, -28.9323) -> (-1.056, -38.212)
  line L19 (-1.056, -38.212) -> (-20.7914, -31.323)
  line L20 (-20.7914, -31.323) -> (-17.5522, -22.0433)
  point P0 (0, 0)
extrude "Extrusion6" cut sketch "Sketch12" against normal blind 10 contours L17 L18 L19 L20 L12 L13 | L13 L12 L17 L16
sketch "Sketch13" plane through (0, 0, 1) normal (0, 0, 1) x (1, 0, 0)
  line L0 (-16.3792, -22.4528) -> (-1.0025, -27.8203) construction
  arc A0 (-1.0025, -27.8203) -> (15.3208, -21.1808) centre (-1.1083, -4.1747) ccw construction
  line L1 (15.3208, -21.1808) -> (15.3208, 14.4797) construction
  line L2 (15.3208, 14.4797) -> (4.1208, 14.4797) construction
  line L3 (4.1208, 14.4797) -> (4.1208, 27.2797) construction
  line L4 (4.1208, 27.2797) -> (-5.6792, 27.2797) construction
  line L5 (-5.6792, 27.2797) -> (-5.6792, 12.4797) construction
  line L6 (-5.6792, 12.4797) -> (-24.8792, 12.4797) construction
  line L7 (-24.8792, 12.4797) -> (-24.8792, -3.3703) construction
  line L8 (-24.8792, -3.3703) -> (-16.3792, -3.3703) construction
  line L9 (-16.3792, -3.3703) -> (-16.3792, -22.4528) construction
  line L10 (-11.6292, -10.9703) -> (-11.6292, 4.2797) construction
  line L11 (-11.6292, 4.2797) -> (8.3708, 4.2797) construction
  line L12 (8.3708, 4.2797) -> (8.3708, -10.9703) construction
  line L13 (8.3708, -10.9703) -> (-11.6292, -10.9703) construction
  circle A1 centre (-14.9792, -20.5703) radius 0.6105 construction
  circle A2 centre (-18.8292, -0.8203) radius 1.2295 construction
  circle A3 centre (12.0208, -21.4394) radius 0.6105 construction
  circle A4 centre (-3.6792, 25.2797) radius 0.6105 construction
  line L14 (20.7608, -14.0343) -> (18.4748, -16.3203) construction
  line L15 (-17.5932, -16.3203) -> (-19.8792, -14.0343) construction
  line L16 (20.8224, -16.3818) -> (-19.8792, -16.3818)
  line L17 (-19.8792, -16.3818) -> (-19.8792, -7.3818)
  line L18 (-19.8792, -7.3818) -> (20.8224, -7.3818)
  line L19 (20.8224, -7.3818) -> (20.8224, -16.3818)
  point P0 (0, 0)
  dimension "d56" = 9
extrude "Extrusion7" add sketch "Sketch13" against normal up to surface (1 mm away)
sketch "Sketch14" plane through (0, 0, 1) normal (0, 0, 1) x (1, 0, 0)
  line L0 (15.3208, -7.3818) -> (15.3208, 14.4797) projected
  line L1 (15.3208, 14.4797) -> (4.1208, 14.4797) projected
  line L2 (4.1208, 14.4797) -> (4.1208, 27.2797) projected
  line L3 (4.1208, 27.2797) -> (-5.6792, 27.2797) projected
  line L4 (-5.6792, 27.2797) -> (-5.6792, 12.4797) projected
  line L5 (-5.6792, 12.4797) -> (-24.8792, 12.4797) projected
  line L6 (-24.8792, 12.4797) -> (-24.8792, -3.3703) projected
  line L7 (-24.8792, -3.3703) -> (-16.3792, -3.3703) projected
  line L8 (-16.3792, -3.3703) -> (-16.3792, -7.3818) projected
  line L9 (-19.8792, -7.3818) -> (-16.3792, -7.3818) projected
  line L10 (-19.8792, -16.3818) -> (-19.8792, -7.3818) projected
  line L11 (-16.3792, -16.3818) -> (-19.8792, -16.3818) projected
  line L12 (-16.3792, -16.3818) -> (-16.3792, -22.4528) projected
  line L13 (-16.3792, -22.4528) -> (-1.0025, -27.8203) projected
  arc A0 (-1.0025, -27.8203) -> (15.3208, -21.1808) centre (-1.1083, -4.1747) ccw projected
  line L14 (15.3208, -21.1808) -> (15.3208, -16.3818) projected
  line L15 (20.8224, -16.3818) -> (15.3208, -16.3818) projected
  line L16 (20.8224, -7.3818) -> (20.8224, -16.3818) projected
  line L17 (15.3208, -7.3818) -> (20.8224, -7.3818) projected
  circle A1 centre (-3.6792, 25.2797) radius 0.6105 projected
  circle A2 centre (-18.8292, -0.8203) radius 1.2295 projected
  line L18 (-11.6292, -7.3818) -> (8.3708, -7.3818) projected
  line L19 (-11.6292, -7.3818) -> (-11.6292, 4.2797) projected
  line L20 (-11.6292, 4.2797) -> (8.3708, 4.2797) projected
  line L21 (8.3708, 4.2797) -> (8.3708, -7.3818) projected
  circle A3 centre (-14.9792, -20.5703) radius 0.6105 projected
  circle A4 centre (12.0208, -21.4394) radius 0.6105 projected
  point P0 (0, 0)
extrude "Extrusion8" add sketch "Sketch14" along normal blind 1
sketch "Sketch15" plane through (0, 0, 2) normal (0, 0, 1) x (1, 0, 0)
  circle A0 centre (15.4408, -11.0002) radius 3.0099 construction
  circle A1 centre (-14.5591, -11.0002) radius 3.0099 construction
  circle A2 centre (15.4408, -11.0002) radius 2.8099
  circle A3 centre (-14.5591, -11.0002) radius 2.8099
  point P0 (0, 0)
  dimension "d61" = 0.2
  dimension "d62" = 0.2
extrude "Extrusion9" add sketch "Sketch15" along normal blind 10
properties part number "00_Adapter_XY_Translator_Thorlabs"
